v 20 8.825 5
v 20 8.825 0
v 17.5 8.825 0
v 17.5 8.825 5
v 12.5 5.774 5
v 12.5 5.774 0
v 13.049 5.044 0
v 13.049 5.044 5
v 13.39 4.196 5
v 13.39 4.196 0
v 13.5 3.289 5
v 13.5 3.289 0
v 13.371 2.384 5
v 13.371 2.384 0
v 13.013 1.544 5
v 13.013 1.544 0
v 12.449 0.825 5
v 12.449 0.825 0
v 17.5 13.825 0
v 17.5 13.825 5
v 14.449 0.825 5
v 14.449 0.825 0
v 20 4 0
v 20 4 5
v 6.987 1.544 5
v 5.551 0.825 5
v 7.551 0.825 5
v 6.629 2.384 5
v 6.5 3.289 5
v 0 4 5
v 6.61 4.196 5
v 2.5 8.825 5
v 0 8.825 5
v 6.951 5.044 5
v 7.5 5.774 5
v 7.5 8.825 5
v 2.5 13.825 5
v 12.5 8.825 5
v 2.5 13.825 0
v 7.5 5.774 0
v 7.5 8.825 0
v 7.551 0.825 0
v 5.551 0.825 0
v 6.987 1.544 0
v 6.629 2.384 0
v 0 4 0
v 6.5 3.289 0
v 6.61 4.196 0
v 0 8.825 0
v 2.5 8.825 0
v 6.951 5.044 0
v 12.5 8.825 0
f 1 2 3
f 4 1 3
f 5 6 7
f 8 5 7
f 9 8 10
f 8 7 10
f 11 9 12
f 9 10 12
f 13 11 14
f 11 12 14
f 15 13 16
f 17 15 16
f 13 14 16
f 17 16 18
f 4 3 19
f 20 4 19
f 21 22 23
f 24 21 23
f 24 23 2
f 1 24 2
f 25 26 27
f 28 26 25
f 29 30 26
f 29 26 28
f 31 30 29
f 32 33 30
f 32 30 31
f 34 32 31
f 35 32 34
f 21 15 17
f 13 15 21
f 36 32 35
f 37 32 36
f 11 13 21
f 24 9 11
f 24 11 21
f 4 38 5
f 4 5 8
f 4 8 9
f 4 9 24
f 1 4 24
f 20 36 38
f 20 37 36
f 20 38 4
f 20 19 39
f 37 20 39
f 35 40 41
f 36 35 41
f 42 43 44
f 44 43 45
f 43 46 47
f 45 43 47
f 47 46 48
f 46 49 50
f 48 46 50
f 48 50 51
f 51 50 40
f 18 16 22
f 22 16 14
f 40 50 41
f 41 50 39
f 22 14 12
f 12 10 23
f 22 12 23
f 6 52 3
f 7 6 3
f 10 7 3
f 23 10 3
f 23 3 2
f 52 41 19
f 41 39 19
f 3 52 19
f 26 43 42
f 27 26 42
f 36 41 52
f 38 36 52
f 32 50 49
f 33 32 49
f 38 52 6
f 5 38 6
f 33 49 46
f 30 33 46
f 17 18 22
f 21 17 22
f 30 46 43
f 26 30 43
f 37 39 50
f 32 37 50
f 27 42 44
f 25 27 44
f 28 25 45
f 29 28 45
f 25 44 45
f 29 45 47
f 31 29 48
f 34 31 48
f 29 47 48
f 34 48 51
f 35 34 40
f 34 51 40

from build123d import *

# Parameters (mm, degrees)
BOSS_EXTRUDE1_DEPTH = 5


with BuildPart() as part:
    # Sketch1 → Boss-Extrude1 (new body)
    with BuildSketch(Plane.XY):
        with BuildLine():
            Line((5.550510257, 0.824633862), (7.550510257, 0.824633862))
            ThreePointArc((7.550510257, 0.824633862), (6.500182239, 3.288917717), (7.5, 5.774123605))
            Line((7.5, 5.774123605), (7.5, 8.824633862))
            Line((7.5, 8.824633862), (12.5, 8.824633862))
            Line((12.5, 8.824633862), (12.5, 5.774123605))
            ThreePointArc((12.5, 5.774123605), (13.499817761, 3.288917717), (12.449489743, 0.824633862))
            Line((12.449489743, 0.824633862), (14.449489743, 0.824633862))
            Line((14.449489743, 0.824633862), (20, 4))
            Line((20, 4), (20, 8.824633862))
            Line((20, 8.824633862), (17.5, 8.824633862))
            Line((17.5, 8.824633862), (17.5, 13.824633862))
            Line((17.5, 13.824633862), (10, 13.824633862))
            Line((10, 13.824633862), (2.5, 13.824633862))
            Line((2.5, 13.824633862), (2.5, 8.824633862))
            Line((2.5, 8.824633862), (0, 8.824633862))
            Line((0, 8.824633862), (0, 4))
            Line((0, 4), (5.550510257, 0.824633862))
        make_face()
    extrude(amount=BOSS_EXTRUDE1_DEPTH)


solid = part.part
